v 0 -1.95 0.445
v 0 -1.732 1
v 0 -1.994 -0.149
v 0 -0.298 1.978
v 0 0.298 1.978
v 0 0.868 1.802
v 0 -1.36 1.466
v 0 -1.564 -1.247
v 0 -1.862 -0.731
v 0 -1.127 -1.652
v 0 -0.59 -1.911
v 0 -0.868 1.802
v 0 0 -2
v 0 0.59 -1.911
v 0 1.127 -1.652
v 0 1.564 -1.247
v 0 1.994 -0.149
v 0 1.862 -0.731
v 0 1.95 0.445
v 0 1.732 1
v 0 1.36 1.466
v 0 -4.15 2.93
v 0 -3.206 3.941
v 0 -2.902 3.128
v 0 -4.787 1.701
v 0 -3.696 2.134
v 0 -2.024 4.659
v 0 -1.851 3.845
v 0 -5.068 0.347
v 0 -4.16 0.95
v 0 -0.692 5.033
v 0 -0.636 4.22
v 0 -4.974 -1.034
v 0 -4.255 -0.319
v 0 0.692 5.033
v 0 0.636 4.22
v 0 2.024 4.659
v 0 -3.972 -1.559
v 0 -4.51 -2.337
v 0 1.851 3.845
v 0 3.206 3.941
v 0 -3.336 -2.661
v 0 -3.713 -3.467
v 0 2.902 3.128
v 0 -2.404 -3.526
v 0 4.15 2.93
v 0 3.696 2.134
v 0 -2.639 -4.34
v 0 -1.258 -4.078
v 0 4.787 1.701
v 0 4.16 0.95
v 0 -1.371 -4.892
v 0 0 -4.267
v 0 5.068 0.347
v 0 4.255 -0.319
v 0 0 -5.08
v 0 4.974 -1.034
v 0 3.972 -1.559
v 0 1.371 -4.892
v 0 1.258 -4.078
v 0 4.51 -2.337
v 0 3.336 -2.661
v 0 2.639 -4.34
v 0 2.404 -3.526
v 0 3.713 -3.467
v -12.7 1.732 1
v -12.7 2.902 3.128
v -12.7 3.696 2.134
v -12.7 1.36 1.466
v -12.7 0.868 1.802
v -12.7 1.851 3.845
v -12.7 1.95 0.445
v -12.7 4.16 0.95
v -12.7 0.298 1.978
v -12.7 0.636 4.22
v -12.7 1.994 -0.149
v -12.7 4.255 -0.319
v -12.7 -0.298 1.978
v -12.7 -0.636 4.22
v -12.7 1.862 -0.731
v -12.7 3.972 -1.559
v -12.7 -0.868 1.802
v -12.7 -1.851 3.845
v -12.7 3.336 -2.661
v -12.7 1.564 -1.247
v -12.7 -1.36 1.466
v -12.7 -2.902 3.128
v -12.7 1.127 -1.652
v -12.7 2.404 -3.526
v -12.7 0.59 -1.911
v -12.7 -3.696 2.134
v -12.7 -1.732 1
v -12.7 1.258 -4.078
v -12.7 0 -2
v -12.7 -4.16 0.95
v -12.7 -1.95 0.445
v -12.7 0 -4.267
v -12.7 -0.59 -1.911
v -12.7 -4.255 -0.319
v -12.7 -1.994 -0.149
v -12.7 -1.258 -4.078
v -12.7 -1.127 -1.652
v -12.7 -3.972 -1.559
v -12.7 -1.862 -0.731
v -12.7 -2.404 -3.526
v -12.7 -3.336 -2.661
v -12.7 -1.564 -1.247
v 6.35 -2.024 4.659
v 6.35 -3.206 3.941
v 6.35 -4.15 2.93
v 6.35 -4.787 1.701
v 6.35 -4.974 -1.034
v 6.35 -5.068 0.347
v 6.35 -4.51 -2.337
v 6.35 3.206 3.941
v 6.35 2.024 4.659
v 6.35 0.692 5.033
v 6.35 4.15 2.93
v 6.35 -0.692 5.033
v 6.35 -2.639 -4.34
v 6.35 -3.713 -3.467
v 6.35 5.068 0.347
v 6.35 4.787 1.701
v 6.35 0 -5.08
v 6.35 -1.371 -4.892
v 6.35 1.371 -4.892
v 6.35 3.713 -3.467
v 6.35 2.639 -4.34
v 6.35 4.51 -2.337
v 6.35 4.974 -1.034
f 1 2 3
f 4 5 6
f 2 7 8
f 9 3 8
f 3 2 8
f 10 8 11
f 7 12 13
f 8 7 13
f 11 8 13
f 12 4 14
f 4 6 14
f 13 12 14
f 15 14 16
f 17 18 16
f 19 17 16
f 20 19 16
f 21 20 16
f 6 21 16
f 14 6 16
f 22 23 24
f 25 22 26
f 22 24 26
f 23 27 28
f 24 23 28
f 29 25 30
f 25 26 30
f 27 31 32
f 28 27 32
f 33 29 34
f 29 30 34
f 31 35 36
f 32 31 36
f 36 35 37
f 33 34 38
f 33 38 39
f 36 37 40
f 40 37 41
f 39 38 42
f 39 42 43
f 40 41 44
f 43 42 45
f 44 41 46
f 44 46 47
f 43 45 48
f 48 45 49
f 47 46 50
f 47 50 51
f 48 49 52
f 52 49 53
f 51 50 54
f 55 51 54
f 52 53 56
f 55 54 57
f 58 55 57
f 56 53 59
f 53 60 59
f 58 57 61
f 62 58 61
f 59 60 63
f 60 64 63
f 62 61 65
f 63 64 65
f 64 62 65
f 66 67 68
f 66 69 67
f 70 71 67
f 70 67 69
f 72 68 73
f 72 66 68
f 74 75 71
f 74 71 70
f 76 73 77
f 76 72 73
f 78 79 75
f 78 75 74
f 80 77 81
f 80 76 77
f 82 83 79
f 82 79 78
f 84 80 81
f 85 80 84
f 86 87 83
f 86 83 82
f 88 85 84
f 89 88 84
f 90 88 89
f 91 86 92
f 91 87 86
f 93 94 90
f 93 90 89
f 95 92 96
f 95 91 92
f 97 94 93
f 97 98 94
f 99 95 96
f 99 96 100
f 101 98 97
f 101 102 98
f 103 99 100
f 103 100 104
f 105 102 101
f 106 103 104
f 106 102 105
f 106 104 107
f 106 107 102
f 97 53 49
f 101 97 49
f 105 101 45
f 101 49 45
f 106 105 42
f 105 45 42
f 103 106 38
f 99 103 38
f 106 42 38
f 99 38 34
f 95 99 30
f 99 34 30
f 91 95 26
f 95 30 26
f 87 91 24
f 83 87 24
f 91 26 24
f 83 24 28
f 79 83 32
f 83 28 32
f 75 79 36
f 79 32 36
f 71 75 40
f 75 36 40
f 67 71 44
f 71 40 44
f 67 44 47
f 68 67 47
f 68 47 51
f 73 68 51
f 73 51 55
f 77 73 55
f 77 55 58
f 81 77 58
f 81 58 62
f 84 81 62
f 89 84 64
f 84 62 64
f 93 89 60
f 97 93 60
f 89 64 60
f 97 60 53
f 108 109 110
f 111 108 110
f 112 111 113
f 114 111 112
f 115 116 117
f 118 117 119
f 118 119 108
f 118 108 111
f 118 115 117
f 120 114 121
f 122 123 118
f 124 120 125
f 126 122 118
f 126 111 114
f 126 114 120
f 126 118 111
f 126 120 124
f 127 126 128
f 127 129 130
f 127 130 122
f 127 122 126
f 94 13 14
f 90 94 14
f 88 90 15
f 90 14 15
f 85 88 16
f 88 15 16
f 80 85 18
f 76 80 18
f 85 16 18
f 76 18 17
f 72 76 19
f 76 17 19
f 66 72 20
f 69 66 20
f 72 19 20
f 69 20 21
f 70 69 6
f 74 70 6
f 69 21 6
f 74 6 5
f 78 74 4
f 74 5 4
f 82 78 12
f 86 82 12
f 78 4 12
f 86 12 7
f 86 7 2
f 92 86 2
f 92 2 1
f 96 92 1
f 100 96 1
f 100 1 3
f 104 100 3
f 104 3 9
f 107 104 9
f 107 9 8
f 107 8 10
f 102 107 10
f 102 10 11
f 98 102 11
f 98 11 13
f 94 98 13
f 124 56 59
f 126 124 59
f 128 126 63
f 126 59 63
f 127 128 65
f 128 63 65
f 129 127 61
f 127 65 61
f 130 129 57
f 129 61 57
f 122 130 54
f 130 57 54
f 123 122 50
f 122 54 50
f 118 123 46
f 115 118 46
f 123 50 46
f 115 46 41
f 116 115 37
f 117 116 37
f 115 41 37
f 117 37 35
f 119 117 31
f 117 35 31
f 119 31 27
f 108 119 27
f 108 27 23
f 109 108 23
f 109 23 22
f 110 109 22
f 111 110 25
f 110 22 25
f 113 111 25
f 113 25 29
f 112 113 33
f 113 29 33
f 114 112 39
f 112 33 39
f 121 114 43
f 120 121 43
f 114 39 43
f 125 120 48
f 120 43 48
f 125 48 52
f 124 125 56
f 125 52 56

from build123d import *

# Parameters (mm, degrees)
SKETCH1_R                       = 5.08
BOSS_EXTRUDE1_DEPTH             = 6.35
SKETCH2_R                       = 4.2672
BOSS_EXTRUDE2_DEPTH             = 12.7
F_21_0_159_DIAMETER_HOLE1_D     = 3.999999874
F_21_0_159_DIAMETER_HOLE1_DEPTH = 12.7


with BuildPart() as part:
    # Sketch1 → Boss-Extrude1 (new body)
    with BuildSketch(Plane(origin=(0, 0, 0), x_dir=(0, 0, -1), z_dir=(1, 0, 0))):
        Circle(SKETCH1_R)
    extrude(amount=BOSS_EXTRUDE1_DEPTH)

    # Sketch2 → Boss-Extrude2 (add)
    with BuildSketch(Plane.ZY):
        with Locations(Location((0, 0, 0), (0, 0, 180))):
            Circle(SKETCH2_R)
    extrude(amount=BOSS_EXTRUDE2_DEPTH)

    # #21 (0.159) Diameter Hole1
    with Locations(Plane.ZY.offset(12.7)):
        with Locations((0, 0)):
            Hole(F_21_0_159_DIAMETER_HOLE1_D / 2, depth=F_21_0_159_DIAMETER_HOLE1_DEPTH)


solid = part.part
